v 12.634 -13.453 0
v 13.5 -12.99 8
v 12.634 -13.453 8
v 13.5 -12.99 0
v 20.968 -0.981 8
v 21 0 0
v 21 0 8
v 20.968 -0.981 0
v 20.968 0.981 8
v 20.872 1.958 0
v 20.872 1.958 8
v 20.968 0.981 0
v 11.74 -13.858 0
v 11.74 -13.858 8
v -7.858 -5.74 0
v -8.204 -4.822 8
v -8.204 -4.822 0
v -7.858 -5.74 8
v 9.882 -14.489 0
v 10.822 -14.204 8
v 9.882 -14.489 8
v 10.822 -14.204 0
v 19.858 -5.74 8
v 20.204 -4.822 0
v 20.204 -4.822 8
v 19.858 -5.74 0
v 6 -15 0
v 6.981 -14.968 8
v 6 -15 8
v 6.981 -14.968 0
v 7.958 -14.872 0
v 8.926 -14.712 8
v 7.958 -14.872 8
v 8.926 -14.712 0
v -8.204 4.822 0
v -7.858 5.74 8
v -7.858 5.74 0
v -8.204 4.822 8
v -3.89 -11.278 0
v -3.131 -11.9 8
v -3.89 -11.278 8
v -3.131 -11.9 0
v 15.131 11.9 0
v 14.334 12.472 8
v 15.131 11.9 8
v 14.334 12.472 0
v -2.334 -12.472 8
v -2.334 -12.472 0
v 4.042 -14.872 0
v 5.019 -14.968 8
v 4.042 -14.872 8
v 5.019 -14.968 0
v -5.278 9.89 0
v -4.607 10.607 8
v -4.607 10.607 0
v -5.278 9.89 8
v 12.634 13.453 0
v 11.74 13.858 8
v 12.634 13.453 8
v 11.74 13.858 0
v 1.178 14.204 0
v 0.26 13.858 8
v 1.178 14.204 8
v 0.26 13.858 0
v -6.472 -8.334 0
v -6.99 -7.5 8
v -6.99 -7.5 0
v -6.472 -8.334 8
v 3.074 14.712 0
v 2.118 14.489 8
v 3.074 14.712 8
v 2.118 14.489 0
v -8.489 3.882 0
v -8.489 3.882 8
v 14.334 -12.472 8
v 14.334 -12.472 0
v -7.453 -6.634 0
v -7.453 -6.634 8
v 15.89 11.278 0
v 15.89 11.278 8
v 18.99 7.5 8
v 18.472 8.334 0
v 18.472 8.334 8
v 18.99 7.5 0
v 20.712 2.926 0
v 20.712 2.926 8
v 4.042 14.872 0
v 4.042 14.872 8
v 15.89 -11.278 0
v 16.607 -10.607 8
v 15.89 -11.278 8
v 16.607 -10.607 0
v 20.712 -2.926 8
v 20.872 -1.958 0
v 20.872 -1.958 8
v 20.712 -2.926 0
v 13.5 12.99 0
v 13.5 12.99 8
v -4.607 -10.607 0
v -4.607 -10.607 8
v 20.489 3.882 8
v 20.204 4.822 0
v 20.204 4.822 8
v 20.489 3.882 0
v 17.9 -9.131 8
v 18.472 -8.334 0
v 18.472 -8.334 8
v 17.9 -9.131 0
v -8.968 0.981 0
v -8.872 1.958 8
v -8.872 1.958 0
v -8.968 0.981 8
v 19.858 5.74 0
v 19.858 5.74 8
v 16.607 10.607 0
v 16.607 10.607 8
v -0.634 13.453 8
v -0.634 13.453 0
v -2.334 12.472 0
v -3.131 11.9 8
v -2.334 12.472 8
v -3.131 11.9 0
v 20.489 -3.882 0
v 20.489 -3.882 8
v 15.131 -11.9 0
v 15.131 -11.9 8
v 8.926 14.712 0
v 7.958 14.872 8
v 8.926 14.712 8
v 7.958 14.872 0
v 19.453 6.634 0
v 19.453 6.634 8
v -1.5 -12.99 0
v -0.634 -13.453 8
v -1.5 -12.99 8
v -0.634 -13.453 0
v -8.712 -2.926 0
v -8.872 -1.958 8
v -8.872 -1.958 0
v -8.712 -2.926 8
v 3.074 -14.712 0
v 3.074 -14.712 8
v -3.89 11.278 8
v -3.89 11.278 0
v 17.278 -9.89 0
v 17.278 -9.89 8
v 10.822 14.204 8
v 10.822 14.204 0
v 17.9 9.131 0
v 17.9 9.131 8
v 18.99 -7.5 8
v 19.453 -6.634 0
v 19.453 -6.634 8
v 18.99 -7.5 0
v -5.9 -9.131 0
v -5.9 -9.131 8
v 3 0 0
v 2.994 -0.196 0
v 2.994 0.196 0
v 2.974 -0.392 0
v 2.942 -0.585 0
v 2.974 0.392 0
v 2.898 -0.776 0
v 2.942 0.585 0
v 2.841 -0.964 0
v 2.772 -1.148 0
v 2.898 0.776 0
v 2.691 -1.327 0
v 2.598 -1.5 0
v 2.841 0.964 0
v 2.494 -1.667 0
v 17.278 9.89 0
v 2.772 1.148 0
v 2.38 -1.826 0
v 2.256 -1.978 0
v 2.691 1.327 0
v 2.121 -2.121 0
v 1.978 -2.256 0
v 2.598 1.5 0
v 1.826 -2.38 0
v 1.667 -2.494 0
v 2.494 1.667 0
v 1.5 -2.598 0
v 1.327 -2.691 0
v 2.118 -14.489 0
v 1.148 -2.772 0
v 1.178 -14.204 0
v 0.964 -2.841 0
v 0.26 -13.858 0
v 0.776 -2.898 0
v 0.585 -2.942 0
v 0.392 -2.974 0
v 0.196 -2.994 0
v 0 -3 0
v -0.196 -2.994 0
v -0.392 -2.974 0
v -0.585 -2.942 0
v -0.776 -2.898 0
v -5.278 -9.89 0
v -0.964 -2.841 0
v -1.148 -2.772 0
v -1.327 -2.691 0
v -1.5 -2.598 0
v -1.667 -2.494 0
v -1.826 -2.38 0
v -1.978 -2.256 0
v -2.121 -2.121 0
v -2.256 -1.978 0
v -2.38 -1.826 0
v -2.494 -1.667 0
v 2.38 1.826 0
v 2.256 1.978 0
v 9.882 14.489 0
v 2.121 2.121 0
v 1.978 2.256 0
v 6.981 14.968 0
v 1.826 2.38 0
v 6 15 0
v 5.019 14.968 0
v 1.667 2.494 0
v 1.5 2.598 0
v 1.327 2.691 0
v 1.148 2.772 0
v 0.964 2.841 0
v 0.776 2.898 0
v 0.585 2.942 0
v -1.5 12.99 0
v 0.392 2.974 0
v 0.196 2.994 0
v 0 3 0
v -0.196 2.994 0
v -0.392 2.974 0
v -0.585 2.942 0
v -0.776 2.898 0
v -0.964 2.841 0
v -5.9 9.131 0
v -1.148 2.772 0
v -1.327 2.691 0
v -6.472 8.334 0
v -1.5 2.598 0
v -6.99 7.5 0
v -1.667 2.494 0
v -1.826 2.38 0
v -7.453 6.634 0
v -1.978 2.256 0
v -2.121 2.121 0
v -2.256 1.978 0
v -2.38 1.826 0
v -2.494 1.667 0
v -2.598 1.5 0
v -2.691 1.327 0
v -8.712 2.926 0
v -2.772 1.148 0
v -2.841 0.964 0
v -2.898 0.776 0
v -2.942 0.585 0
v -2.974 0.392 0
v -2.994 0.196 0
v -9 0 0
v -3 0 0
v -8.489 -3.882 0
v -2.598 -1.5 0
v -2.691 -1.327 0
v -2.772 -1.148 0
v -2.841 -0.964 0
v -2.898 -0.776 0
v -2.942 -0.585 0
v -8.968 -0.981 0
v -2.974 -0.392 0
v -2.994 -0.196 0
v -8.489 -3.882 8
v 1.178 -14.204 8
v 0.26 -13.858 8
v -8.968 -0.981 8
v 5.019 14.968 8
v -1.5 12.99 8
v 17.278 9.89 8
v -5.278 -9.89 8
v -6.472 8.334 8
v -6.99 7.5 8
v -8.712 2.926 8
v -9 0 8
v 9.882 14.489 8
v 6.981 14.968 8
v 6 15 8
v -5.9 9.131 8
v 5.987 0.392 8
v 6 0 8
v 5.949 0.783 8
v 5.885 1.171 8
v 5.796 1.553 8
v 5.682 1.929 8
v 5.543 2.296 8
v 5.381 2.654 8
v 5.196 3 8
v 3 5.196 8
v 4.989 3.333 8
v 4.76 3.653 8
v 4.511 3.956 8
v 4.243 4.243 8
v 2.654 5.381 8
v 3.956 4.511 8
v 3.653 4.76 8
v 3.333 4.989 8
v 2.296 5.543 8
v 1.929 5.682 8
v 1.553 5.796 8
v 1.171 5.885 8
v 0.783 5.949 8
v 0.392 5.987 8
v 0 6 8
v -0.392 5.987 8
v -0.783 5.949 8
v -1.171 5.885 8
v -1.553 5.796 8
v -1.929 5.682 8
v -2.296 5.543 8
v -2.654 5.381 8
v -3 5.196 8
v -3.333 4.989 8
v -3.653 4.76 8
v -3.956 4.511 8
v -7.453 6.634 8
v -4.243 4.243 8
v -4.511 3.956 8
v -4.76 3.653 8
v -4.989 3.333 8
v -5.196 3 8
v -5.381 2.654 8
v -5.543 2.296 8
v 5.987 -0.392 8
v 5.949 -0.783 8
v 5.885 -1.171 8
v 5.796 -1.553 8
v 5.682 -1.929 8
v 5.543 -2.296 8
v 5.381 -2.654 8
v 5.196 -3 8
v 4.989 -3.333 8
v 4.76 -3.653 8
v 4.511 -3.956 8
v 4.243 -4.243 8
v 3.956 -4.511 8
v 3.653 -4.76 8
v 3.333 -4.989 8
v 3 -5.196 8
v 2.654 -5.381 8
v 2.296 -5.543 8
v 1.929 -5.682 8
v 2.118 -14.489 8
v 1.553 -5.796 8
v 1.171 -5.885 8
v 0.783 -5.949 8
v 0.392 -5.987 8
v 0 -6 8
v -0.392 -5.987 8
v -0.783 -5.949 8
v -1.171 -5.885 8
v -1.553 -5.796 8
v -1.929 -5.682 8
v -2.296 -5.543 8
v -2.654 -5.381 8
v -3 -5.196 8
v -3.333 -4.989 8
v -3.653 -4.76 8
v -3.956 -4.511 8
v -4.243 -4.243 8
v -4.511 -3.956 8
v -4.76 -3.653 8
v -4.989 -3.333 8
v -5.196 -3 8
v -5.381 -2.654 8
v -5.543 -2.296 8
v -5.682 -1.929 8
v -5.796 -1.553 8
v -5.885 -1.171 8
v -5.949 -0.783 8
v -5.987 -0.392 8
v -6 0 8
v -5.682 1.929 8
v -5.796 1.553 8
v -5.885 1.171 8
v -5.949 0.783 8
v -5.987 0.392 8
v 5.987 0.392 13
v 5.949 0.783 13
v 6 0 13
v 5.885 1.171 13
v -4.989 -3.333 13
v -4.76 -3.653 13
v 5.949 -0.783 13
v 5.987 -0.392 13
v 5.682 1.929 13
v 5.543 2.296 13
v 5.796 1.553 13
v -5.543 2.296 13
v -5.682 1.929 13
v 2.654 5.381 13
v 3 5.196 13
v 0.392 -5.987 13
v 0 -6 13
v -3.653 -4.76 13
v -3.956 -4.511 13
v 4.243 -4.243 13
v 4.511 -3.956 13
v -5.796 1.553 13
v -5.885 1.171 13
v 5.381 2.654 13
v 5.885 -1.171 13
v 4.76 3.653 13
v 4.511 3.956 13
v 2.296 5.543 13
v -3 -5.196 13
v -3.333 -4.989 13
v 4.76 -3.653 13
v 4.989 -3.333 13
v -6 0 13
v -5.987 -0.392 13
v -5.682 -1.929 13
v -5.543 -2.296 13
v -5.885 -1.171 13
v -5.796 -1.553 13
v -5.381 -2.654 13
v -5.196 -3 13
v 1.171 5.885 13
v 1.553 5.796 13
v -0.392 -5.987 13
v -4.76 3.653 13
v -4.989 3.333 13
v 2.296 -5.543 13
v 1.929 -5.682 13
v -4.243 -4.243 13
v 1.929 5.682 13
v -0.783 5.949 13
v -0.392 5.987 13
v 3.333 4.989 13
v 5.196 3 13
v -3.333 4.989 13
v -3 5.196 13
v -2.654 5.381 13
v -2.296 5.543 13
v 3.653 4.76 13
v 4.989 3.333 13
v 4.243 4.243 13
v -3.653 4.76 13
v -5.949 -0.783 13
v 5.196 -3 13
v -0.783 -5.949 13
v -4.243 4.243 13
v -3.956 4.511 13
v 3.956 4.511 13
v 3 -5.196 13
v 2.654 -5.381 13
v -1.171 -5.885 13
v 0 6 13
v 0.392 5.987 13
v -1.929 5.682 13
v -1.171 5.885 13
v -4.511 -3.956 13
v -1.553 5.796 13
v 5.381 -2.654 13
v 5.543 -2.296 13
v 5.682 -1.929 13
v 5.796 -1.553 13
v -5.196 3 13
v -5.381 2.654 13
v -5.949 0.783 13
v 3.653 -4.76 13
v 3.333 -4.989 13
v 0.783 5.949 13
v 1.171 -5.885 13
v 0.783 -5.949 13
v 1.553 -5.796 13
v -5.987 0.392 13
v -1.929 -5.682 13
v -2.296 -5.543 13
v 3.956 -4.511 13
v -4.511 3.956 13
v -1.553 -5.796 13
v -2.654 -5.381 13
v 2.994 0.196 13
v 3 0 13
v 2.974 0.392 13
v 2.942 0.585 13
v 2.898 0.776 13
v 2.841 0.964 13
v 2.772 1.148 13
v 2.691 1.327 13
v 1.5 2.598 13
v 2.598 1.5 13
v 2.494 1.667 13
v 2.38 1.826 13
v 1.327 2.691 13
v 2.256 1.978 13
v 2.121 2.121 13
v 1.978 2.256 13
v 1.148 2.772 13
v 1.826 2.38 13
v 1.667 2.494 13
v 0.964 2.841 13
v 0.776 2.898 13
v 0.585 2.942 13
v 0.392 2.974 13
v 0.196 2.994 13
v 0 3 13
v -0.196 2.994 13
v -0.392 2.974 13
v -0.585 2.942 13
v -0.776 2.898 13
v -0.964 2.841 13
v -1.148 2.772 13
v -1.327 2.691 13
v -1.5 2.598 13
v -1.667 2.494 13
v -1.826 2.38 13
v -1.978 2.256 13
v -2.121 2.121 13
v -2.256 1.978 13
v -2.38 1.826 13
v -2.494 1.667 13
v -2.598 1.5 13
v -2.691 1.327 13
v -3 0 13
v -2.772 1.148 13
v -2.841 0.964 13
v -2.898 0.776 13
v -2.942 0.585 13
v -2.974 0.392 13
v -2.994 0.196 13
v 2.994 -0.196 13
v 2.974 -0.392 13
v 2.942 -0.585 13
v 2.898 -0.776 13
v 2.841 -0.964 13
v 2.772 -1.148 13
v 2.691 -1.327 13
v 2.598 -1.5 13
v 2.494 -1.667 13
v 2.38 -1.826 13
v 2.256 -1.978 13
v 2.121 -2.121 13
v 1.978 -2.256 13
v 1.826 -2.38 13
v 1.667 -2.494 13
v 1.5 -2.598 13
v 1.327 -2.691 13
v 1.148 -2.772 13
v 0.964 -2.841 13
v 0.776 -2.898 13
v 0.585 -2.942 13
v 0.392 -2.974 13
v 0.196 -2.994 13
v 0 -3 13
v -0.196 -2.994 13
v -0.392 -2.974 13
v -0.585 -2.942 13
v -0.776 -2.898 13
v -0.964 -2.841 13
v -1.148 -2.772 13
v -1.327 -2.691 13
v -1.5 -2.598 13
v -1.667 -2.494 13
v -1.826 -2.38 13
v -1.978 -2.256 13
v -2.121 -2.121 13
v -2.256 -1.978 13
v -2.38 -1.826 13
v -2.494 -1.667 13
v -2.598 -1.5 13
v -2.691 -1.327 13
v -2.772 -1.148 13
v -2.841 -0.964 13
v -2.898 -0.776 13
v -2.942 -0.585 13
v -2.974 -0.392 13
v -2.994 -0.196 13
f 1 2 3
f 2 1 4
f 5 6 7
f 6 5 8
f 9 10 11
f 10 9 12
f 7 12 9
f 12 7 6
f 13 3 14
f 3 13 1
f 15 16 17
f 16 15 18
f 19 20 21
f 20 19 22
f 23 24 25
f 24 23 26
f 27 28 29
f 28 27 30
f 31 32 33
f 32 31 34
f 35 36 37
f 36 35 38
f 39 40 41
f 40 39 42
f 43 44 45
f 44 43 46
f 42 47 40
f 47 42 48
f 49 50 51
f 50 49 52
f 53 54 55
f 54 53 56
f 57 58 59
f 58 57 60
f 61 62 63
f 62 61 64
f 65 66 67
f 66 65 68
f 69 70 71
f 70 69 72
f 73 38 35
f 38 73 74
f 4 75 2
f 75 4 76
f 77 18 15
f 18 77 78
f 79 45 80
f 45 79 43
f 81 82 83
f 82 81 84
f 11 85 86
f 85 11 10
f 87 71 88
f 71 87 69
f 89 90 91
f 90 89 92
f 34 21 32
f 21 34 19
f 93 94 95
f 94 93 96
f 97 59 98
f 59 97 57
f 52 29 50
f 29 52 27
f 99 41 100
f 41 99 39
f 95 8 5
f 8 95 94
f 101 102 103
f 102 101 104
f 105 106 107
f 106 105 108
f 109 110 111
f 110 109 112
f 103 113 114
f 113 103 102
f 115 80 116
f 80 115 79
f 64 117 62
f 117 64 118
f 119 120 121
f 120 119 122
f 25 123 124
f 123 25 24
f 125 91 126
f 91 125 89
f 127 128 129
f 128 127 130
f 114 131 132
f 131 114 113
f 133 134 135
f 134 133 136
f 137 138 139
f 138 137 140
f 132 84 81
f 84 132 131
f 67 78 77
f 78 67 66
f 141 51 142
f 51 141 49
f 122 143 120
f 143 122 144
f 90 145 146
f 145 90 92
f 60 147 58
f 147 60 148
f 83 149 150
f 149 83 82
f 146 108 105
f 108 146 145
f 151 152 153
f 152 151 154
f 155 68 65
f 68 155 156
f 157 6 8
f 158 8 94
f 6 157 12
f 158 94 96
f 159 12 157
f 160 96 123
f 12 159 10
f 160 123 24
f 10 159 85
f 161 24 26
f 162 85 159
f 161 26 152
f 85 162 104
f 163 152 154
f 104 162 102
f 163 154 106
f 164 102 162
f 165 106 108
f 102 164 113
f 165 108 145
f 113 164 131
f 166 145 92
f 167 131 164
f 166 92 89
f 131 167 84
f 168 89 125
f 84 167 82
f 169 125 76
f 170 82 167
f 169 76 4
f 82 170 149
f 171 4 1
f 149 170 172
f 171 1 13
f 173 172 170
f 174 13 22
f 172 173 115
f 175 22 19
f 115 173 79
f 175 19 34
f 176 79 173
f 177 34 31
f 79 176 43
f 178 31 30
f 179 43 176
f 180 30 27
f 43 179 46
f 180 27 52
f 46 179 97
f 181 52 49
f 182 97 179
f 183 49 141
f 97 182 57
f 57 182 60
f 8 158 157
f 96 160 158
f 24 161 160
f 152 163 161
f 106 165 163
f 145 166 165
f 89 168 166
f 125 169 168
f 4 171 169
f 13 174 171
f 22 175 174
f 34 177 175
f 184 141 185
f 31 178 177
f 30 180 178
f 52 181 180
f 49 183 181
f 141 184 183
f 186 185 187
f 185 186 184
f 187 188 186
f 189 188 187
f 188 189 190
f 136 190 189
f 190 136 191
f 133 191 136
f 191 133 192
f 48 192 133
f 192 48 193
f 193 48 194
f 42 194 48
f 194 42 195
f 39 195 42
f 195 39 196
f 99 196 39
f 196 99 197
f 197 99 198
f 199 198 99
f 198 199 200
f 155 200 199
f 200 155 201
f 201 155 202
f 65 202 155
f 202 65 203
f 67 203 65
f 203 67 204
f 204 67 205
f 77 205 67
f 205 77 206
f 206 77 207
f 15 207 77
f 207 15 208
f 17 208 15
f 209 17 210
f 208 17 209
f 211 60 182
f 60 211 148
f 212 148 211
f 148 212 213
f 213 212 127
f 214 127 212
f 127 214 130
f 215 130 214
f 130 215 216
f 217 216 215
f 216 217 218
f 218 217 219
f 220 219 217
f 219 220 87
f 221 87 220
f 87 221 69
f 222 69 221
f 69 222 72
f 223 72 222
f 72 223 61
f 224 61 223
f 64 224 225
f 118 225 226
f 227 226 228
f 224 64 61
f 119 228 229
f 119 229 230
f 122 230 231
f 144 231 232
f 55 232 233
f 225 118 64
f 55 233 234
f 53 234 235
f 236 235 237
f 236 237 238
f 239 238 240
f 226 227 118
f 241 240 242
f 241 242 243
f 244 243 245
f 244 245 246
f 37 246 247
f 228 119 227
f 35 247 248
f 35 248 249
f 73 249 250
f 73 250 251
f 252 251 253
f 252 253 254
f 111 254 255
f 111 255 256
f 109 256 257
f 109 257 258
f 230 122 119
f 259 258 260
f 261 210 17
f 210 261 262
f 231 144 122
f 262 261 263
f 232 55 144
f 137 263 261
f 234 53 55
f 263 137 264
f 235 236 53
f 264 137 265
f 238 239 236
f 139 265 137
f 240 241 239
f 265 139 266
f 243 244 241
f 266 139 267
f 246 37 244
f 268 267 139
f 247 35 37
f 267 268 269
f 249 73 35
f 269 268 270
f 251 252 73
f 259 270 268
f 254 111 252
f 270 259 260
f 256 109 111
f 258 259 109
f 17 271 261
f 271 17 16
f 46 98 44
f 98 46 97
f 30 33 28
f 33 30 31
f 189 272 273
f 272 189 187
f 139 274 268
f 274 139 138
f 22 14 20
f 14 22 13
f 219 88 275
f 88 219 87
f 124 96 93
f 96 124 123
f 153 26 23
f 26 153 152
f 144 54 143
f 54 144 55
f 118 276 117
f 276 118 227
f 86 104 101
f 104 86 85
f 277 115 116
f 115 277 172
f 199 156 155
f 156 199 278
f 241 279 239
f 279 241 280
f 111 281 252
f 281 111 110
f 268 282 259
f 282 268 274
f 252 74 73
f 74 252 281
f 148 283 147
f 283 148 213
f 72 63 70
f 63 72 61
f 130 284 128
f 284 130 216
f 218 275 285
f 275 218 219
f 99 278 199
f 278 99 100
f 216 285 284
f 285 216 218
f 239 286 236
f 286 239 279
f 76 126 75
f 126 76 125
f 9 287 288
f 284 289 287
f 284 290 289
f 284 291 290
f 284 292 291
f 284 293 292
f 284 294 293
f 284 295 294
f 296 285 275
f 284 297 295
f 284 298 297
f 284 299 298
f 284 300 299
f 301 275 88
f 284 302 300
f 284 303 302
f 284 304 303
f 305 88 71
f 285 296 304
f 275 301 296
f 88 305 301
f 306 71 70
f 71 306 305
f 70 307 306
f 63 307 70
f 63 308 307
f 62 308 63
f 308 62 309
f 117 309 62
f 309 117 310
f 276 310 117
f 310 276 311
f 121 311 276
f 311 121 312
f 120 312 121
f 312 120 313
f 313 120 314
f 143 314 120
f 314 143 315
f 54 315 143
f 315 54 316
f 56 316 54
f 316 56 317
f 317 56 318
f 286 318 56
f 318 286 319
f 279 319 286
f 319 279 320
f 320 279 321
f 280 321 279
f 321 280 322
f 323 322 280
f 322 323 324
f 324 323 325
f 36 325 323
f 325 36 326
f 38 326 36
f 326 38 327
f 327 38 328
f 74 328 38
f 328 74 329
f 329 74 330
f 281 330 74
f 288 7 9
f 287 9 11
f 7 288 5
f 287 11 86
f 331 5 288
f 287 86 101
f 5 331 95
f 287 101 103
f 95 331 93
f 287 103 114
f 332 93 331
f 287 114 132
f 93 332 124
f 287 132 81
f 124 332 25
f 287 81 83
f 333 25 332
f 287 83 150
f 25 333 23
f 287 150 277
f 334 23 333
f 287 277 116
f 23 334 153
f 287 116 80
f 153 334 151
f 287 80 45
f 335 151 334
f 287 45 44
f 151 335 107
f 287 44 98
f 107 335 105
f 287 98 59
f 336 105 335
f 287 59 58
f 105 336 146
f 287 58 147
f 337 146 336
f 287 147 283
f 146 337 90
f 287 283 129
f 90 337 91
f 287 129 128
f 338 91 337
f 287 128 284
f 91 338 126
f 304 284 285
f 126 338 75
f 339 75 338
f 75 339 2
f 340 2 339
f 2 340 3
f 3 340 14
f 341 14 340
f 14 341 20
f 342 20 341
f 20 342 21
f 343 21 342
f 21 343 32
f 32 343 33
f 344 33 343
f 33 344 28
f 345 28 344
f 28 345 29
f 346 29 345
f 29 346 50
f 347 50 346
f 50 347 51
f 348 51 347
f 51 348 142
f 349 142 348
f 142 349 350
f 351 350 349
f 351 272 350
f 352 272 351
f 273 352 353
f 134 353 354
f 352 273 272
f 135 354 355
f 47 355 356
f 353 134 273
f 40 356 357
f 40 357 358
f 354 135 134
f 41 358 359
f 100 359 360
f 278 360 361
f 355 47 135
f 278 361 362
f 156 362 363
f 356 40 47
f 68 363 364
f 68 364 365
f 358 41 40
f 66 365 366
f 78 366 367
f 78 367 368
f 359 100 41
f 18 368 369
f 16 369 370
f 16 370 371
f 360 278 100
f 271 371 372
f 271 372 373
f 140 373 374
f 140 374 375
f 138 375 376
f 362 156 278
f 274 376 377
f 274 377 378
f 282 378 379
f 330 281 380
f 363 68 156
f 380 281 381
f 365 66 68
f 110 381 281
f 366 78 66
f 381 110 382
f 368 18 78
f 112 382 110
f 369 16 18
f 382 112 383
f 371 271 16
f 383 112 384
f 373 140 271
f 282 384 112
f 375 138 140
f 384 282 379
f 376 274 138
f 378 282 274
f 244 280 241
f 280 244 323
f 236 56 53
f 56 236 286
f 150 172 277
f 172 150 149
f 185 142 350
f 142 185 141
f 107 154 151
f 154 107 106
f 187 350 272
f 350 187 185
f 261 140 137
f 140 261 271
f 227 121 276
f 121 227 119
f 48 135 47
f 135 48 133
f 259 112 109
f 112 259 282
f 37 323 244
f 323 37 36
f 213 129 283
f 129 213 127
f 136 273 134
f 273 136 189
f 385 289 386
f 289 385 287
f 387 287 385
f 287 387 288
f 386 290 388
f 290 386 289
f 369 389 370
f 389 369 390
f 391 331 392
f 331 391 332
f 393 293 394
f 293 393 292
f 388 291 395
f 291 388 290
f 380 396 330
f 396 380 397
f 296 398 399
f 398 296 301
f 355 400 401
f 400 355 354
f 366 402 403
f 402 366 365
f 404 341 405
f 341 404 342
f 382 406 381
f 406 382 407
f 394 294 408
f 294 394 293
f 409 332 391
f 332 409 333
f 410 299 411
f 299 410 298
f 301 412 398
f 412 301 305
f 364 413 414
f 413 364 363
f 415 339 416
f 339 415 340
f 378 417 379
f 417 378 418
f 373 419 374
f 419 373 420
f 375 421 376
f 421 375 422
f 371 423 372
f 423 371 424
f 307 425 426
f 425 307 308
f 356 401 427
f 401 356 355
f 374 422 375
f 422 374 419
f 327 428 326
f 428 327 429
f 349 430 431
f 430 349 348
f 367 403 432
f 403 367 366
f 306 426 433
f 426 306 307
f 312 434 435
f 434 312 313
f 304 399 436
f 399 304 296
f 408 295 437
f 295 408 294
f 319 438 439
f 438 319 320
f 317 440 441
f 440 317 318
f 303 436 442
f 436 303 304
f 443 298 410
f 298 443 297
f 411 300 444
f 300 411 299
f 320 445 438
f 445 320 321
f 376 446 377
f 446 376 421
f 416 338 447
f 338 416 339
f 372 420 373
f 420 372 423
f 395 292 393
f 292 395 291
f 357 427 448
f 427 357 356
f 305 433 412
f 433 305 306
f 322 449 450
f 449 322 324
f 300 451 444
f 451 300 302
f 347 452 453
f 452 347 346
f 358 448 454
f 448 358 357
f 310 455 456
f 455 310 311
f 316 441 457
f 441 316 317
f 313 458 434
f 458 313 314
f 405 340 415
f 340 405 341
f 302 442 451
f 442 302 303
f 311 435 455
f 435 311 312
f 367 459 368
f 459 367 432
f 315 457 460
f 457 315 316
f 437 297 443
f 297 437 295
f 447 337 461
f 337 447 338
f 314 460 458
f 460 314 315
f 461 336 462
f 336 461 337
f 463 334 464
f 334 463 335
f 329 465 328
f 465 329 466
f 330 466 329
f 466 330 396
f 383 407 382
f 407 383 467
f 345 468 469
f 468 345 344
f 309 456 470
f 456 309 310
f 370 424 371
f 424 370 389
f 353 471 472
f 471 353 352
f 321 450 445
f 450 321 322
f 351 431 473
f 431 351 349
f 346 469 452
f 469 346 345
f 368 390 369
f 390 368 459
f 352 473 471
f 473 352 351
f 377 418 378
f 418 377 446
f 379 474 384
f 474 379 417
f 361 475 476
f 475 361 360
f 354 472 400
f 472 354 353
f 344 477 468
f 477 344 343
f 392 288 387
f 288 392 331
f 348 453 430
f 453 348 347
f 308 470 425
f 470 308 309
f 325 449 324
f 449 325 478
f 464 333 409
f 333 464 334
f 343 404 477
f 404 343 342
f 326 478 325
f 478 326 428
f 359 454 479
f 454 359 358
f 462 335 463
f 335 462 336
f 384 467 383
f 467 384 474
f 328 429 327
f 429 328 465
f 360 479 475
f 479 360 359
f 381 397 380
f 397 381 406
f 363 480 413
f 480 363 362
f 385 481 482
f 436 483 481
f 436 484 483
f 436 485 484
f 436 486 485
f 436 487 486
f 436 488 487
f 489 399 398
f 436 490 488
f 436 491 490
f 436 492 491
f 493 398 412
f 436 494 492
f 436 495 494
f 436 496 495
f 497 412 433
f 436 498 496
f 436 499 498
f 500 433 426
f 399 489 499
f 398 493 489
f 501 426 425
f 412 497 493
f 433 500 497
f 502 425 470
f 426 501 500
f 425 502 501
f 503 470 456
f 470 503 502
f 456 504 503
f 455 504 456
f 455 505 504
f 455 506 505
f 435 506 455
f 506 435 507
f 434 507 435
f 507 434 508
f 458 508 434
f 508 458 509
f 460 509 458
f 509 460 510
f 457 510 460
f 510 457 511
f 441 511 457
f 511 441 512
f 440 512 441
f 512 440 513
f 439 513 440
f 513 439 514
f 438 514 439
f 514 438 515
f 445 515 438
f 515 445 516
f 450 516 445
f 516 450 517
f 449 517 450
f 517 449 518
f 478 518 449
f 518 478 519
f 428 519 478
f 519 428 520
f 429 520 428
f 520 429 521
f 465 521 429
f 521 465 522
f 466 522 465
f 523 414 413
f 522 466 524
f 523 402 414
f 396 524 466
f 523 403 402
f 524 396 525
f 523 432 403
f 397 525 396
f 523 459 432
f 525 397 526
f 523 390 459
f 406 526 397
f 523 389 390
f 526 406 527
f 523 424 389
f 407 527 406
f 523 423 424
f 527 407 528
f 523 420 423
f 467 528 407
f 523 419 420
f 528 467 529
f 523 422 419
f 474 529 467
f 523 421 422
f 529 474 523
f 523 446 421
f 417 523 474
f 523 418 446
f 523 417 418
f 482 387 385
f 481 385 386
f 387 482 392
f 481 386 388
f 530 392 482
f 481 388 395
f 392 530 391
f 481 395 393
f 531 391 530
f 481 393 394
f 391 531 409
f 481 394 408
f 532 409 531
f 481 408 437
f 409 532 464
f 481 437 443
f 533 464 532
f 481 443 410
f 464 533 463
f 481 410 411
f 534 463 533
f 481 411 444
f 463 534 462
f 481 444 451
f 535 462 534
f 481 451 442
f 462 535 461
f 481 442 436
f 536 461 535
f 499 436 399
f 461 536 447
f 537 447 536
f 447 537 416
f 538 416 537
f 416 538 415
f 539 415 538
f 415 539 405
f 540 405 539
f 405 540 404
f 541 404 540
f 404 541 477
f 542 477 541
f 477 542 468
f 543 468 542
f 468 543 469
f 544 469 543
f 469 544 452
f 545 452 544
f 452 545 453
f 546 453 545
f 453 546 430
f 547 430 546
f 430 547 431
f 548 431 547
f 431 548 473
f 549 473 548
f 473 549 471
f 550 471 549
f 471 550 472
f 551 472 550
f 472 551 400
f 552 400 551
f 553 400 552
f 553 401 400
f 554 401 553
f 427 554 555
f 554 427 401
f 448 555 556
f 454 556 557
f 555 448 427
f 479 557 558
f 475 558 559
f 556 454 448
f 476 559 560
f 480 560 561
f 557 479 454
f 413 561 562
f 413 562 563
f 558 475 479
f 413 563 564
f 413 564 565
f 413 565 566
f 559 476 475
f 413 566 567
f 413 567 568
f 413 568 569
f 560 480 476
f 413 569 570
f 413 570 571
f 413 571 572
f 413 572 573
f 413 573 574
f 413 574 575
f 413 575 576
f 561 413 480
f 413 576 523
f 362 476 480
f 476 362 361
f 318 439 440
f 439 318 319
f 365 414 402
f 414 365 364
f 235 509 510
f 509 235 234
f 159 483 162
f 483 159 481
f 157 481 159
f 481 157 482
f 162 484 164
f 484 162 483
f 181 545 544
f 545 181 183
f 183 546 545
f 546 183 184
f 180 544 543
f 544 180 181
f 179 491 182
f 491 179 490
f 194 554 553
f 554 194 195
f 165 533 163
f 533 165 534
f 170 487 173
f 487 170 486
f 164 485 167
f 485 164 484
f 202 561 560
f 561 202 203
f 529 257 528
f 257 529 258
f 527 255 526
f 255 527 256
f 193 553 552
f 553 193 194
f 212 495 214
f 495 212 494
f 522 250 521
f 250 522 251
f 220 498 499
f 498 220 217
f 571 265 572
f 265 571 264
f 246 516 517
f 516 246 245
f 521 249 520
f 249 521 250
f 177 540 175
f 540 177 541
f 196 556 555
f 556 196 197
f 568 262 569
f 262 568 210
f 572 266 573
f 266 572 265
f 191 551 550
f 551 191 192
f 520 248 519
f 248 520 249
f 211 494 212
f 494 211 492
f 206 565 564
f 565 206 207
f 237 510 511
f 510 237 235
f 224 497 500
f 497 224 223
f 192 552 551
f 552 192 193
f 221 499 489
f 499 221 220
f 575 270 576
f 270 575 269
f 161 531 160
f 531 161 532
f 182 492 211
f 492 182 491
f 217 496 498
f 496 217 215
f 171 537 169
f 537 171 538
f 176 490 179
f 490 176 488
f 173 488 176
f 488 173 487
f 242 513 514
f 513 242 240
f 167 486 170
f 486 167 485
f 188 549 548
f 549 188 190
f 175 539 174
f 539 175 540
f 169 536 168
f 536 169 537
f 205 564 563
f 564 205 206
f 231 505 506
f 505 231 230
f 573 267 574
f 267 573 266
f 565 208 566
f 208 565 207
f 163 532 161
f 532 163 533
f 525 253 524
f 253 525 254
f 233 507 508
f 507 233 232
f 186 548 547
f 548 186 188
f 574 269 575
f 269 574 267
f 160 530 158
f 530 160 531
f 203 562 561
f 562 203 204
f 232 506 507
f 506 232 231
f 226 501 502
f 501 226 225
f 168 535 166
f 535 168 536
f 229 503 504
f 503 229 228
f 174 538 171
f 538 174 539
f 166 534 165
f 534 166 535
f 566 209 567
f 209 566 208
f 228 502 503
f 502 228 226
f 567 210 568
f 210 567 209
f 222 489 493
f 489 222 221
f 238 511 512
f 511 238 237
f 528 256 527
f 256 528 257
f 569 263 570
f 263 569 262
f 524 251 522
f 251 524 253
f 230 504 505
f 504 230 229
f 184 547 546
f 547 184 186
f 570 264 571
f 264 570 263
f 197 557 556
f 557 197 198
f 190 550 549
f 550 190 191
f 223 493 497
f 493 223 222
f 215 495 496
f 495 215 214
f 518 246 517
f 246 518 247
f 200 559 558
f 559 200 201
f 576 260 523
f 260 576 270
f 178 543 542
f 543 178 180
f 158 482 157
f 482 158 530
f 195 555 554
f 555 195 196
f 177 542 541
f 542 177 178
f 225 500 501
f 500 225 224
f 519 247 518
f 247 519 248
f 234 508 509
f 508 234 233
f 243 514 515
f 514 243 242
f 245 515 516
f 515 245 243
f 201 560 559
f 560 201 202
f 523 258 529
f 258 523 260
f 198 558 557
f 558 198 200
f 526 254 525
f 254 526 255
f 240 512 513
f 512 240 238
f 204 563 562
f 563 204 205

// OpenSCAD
// Eccentric cam for shaker mechanism
// Shaft axis = Z axis (x=0, y=0). Disc is offset in +X.

$fn = 96;

// ---- Dimensions (mm) ----
disc_d      = 30;   // cam disc diameter
disc_t      = 8;    // cam disc thickness (z = 0 .. 8)
eccentric   = 6;    // disc centre offset from shaft axis, along +X
hub_d       = 12;   // hub diameter (on shaft axis)
hub_h       = 5;    // hub height above disc (z = 8 .. 13)
shaft_d     = 6;    // shaft hole diameter
eps         = 0.5;  // overshoot for clean boolean cuts
overlap     = 0.01; // small overlap so hub fuses with disc

total_h = disc_t + hub_h;

difference() {
    union() {
        // Eccentric disc
        translate([eccentric, 0, 0])
            cylinder(d = disc_d, h = disc_t);

        // Hub on shaft axis
        translate([0, 0, disc_t - overlap])
            cylinder(d = hub_d, h = hub_h + overlap);
    }

    // Shaft hole through hub and disc
    translate([0, 0, -eps])
        cylinder(d = shaft_d, h = total_h + 2 * eps);
}
